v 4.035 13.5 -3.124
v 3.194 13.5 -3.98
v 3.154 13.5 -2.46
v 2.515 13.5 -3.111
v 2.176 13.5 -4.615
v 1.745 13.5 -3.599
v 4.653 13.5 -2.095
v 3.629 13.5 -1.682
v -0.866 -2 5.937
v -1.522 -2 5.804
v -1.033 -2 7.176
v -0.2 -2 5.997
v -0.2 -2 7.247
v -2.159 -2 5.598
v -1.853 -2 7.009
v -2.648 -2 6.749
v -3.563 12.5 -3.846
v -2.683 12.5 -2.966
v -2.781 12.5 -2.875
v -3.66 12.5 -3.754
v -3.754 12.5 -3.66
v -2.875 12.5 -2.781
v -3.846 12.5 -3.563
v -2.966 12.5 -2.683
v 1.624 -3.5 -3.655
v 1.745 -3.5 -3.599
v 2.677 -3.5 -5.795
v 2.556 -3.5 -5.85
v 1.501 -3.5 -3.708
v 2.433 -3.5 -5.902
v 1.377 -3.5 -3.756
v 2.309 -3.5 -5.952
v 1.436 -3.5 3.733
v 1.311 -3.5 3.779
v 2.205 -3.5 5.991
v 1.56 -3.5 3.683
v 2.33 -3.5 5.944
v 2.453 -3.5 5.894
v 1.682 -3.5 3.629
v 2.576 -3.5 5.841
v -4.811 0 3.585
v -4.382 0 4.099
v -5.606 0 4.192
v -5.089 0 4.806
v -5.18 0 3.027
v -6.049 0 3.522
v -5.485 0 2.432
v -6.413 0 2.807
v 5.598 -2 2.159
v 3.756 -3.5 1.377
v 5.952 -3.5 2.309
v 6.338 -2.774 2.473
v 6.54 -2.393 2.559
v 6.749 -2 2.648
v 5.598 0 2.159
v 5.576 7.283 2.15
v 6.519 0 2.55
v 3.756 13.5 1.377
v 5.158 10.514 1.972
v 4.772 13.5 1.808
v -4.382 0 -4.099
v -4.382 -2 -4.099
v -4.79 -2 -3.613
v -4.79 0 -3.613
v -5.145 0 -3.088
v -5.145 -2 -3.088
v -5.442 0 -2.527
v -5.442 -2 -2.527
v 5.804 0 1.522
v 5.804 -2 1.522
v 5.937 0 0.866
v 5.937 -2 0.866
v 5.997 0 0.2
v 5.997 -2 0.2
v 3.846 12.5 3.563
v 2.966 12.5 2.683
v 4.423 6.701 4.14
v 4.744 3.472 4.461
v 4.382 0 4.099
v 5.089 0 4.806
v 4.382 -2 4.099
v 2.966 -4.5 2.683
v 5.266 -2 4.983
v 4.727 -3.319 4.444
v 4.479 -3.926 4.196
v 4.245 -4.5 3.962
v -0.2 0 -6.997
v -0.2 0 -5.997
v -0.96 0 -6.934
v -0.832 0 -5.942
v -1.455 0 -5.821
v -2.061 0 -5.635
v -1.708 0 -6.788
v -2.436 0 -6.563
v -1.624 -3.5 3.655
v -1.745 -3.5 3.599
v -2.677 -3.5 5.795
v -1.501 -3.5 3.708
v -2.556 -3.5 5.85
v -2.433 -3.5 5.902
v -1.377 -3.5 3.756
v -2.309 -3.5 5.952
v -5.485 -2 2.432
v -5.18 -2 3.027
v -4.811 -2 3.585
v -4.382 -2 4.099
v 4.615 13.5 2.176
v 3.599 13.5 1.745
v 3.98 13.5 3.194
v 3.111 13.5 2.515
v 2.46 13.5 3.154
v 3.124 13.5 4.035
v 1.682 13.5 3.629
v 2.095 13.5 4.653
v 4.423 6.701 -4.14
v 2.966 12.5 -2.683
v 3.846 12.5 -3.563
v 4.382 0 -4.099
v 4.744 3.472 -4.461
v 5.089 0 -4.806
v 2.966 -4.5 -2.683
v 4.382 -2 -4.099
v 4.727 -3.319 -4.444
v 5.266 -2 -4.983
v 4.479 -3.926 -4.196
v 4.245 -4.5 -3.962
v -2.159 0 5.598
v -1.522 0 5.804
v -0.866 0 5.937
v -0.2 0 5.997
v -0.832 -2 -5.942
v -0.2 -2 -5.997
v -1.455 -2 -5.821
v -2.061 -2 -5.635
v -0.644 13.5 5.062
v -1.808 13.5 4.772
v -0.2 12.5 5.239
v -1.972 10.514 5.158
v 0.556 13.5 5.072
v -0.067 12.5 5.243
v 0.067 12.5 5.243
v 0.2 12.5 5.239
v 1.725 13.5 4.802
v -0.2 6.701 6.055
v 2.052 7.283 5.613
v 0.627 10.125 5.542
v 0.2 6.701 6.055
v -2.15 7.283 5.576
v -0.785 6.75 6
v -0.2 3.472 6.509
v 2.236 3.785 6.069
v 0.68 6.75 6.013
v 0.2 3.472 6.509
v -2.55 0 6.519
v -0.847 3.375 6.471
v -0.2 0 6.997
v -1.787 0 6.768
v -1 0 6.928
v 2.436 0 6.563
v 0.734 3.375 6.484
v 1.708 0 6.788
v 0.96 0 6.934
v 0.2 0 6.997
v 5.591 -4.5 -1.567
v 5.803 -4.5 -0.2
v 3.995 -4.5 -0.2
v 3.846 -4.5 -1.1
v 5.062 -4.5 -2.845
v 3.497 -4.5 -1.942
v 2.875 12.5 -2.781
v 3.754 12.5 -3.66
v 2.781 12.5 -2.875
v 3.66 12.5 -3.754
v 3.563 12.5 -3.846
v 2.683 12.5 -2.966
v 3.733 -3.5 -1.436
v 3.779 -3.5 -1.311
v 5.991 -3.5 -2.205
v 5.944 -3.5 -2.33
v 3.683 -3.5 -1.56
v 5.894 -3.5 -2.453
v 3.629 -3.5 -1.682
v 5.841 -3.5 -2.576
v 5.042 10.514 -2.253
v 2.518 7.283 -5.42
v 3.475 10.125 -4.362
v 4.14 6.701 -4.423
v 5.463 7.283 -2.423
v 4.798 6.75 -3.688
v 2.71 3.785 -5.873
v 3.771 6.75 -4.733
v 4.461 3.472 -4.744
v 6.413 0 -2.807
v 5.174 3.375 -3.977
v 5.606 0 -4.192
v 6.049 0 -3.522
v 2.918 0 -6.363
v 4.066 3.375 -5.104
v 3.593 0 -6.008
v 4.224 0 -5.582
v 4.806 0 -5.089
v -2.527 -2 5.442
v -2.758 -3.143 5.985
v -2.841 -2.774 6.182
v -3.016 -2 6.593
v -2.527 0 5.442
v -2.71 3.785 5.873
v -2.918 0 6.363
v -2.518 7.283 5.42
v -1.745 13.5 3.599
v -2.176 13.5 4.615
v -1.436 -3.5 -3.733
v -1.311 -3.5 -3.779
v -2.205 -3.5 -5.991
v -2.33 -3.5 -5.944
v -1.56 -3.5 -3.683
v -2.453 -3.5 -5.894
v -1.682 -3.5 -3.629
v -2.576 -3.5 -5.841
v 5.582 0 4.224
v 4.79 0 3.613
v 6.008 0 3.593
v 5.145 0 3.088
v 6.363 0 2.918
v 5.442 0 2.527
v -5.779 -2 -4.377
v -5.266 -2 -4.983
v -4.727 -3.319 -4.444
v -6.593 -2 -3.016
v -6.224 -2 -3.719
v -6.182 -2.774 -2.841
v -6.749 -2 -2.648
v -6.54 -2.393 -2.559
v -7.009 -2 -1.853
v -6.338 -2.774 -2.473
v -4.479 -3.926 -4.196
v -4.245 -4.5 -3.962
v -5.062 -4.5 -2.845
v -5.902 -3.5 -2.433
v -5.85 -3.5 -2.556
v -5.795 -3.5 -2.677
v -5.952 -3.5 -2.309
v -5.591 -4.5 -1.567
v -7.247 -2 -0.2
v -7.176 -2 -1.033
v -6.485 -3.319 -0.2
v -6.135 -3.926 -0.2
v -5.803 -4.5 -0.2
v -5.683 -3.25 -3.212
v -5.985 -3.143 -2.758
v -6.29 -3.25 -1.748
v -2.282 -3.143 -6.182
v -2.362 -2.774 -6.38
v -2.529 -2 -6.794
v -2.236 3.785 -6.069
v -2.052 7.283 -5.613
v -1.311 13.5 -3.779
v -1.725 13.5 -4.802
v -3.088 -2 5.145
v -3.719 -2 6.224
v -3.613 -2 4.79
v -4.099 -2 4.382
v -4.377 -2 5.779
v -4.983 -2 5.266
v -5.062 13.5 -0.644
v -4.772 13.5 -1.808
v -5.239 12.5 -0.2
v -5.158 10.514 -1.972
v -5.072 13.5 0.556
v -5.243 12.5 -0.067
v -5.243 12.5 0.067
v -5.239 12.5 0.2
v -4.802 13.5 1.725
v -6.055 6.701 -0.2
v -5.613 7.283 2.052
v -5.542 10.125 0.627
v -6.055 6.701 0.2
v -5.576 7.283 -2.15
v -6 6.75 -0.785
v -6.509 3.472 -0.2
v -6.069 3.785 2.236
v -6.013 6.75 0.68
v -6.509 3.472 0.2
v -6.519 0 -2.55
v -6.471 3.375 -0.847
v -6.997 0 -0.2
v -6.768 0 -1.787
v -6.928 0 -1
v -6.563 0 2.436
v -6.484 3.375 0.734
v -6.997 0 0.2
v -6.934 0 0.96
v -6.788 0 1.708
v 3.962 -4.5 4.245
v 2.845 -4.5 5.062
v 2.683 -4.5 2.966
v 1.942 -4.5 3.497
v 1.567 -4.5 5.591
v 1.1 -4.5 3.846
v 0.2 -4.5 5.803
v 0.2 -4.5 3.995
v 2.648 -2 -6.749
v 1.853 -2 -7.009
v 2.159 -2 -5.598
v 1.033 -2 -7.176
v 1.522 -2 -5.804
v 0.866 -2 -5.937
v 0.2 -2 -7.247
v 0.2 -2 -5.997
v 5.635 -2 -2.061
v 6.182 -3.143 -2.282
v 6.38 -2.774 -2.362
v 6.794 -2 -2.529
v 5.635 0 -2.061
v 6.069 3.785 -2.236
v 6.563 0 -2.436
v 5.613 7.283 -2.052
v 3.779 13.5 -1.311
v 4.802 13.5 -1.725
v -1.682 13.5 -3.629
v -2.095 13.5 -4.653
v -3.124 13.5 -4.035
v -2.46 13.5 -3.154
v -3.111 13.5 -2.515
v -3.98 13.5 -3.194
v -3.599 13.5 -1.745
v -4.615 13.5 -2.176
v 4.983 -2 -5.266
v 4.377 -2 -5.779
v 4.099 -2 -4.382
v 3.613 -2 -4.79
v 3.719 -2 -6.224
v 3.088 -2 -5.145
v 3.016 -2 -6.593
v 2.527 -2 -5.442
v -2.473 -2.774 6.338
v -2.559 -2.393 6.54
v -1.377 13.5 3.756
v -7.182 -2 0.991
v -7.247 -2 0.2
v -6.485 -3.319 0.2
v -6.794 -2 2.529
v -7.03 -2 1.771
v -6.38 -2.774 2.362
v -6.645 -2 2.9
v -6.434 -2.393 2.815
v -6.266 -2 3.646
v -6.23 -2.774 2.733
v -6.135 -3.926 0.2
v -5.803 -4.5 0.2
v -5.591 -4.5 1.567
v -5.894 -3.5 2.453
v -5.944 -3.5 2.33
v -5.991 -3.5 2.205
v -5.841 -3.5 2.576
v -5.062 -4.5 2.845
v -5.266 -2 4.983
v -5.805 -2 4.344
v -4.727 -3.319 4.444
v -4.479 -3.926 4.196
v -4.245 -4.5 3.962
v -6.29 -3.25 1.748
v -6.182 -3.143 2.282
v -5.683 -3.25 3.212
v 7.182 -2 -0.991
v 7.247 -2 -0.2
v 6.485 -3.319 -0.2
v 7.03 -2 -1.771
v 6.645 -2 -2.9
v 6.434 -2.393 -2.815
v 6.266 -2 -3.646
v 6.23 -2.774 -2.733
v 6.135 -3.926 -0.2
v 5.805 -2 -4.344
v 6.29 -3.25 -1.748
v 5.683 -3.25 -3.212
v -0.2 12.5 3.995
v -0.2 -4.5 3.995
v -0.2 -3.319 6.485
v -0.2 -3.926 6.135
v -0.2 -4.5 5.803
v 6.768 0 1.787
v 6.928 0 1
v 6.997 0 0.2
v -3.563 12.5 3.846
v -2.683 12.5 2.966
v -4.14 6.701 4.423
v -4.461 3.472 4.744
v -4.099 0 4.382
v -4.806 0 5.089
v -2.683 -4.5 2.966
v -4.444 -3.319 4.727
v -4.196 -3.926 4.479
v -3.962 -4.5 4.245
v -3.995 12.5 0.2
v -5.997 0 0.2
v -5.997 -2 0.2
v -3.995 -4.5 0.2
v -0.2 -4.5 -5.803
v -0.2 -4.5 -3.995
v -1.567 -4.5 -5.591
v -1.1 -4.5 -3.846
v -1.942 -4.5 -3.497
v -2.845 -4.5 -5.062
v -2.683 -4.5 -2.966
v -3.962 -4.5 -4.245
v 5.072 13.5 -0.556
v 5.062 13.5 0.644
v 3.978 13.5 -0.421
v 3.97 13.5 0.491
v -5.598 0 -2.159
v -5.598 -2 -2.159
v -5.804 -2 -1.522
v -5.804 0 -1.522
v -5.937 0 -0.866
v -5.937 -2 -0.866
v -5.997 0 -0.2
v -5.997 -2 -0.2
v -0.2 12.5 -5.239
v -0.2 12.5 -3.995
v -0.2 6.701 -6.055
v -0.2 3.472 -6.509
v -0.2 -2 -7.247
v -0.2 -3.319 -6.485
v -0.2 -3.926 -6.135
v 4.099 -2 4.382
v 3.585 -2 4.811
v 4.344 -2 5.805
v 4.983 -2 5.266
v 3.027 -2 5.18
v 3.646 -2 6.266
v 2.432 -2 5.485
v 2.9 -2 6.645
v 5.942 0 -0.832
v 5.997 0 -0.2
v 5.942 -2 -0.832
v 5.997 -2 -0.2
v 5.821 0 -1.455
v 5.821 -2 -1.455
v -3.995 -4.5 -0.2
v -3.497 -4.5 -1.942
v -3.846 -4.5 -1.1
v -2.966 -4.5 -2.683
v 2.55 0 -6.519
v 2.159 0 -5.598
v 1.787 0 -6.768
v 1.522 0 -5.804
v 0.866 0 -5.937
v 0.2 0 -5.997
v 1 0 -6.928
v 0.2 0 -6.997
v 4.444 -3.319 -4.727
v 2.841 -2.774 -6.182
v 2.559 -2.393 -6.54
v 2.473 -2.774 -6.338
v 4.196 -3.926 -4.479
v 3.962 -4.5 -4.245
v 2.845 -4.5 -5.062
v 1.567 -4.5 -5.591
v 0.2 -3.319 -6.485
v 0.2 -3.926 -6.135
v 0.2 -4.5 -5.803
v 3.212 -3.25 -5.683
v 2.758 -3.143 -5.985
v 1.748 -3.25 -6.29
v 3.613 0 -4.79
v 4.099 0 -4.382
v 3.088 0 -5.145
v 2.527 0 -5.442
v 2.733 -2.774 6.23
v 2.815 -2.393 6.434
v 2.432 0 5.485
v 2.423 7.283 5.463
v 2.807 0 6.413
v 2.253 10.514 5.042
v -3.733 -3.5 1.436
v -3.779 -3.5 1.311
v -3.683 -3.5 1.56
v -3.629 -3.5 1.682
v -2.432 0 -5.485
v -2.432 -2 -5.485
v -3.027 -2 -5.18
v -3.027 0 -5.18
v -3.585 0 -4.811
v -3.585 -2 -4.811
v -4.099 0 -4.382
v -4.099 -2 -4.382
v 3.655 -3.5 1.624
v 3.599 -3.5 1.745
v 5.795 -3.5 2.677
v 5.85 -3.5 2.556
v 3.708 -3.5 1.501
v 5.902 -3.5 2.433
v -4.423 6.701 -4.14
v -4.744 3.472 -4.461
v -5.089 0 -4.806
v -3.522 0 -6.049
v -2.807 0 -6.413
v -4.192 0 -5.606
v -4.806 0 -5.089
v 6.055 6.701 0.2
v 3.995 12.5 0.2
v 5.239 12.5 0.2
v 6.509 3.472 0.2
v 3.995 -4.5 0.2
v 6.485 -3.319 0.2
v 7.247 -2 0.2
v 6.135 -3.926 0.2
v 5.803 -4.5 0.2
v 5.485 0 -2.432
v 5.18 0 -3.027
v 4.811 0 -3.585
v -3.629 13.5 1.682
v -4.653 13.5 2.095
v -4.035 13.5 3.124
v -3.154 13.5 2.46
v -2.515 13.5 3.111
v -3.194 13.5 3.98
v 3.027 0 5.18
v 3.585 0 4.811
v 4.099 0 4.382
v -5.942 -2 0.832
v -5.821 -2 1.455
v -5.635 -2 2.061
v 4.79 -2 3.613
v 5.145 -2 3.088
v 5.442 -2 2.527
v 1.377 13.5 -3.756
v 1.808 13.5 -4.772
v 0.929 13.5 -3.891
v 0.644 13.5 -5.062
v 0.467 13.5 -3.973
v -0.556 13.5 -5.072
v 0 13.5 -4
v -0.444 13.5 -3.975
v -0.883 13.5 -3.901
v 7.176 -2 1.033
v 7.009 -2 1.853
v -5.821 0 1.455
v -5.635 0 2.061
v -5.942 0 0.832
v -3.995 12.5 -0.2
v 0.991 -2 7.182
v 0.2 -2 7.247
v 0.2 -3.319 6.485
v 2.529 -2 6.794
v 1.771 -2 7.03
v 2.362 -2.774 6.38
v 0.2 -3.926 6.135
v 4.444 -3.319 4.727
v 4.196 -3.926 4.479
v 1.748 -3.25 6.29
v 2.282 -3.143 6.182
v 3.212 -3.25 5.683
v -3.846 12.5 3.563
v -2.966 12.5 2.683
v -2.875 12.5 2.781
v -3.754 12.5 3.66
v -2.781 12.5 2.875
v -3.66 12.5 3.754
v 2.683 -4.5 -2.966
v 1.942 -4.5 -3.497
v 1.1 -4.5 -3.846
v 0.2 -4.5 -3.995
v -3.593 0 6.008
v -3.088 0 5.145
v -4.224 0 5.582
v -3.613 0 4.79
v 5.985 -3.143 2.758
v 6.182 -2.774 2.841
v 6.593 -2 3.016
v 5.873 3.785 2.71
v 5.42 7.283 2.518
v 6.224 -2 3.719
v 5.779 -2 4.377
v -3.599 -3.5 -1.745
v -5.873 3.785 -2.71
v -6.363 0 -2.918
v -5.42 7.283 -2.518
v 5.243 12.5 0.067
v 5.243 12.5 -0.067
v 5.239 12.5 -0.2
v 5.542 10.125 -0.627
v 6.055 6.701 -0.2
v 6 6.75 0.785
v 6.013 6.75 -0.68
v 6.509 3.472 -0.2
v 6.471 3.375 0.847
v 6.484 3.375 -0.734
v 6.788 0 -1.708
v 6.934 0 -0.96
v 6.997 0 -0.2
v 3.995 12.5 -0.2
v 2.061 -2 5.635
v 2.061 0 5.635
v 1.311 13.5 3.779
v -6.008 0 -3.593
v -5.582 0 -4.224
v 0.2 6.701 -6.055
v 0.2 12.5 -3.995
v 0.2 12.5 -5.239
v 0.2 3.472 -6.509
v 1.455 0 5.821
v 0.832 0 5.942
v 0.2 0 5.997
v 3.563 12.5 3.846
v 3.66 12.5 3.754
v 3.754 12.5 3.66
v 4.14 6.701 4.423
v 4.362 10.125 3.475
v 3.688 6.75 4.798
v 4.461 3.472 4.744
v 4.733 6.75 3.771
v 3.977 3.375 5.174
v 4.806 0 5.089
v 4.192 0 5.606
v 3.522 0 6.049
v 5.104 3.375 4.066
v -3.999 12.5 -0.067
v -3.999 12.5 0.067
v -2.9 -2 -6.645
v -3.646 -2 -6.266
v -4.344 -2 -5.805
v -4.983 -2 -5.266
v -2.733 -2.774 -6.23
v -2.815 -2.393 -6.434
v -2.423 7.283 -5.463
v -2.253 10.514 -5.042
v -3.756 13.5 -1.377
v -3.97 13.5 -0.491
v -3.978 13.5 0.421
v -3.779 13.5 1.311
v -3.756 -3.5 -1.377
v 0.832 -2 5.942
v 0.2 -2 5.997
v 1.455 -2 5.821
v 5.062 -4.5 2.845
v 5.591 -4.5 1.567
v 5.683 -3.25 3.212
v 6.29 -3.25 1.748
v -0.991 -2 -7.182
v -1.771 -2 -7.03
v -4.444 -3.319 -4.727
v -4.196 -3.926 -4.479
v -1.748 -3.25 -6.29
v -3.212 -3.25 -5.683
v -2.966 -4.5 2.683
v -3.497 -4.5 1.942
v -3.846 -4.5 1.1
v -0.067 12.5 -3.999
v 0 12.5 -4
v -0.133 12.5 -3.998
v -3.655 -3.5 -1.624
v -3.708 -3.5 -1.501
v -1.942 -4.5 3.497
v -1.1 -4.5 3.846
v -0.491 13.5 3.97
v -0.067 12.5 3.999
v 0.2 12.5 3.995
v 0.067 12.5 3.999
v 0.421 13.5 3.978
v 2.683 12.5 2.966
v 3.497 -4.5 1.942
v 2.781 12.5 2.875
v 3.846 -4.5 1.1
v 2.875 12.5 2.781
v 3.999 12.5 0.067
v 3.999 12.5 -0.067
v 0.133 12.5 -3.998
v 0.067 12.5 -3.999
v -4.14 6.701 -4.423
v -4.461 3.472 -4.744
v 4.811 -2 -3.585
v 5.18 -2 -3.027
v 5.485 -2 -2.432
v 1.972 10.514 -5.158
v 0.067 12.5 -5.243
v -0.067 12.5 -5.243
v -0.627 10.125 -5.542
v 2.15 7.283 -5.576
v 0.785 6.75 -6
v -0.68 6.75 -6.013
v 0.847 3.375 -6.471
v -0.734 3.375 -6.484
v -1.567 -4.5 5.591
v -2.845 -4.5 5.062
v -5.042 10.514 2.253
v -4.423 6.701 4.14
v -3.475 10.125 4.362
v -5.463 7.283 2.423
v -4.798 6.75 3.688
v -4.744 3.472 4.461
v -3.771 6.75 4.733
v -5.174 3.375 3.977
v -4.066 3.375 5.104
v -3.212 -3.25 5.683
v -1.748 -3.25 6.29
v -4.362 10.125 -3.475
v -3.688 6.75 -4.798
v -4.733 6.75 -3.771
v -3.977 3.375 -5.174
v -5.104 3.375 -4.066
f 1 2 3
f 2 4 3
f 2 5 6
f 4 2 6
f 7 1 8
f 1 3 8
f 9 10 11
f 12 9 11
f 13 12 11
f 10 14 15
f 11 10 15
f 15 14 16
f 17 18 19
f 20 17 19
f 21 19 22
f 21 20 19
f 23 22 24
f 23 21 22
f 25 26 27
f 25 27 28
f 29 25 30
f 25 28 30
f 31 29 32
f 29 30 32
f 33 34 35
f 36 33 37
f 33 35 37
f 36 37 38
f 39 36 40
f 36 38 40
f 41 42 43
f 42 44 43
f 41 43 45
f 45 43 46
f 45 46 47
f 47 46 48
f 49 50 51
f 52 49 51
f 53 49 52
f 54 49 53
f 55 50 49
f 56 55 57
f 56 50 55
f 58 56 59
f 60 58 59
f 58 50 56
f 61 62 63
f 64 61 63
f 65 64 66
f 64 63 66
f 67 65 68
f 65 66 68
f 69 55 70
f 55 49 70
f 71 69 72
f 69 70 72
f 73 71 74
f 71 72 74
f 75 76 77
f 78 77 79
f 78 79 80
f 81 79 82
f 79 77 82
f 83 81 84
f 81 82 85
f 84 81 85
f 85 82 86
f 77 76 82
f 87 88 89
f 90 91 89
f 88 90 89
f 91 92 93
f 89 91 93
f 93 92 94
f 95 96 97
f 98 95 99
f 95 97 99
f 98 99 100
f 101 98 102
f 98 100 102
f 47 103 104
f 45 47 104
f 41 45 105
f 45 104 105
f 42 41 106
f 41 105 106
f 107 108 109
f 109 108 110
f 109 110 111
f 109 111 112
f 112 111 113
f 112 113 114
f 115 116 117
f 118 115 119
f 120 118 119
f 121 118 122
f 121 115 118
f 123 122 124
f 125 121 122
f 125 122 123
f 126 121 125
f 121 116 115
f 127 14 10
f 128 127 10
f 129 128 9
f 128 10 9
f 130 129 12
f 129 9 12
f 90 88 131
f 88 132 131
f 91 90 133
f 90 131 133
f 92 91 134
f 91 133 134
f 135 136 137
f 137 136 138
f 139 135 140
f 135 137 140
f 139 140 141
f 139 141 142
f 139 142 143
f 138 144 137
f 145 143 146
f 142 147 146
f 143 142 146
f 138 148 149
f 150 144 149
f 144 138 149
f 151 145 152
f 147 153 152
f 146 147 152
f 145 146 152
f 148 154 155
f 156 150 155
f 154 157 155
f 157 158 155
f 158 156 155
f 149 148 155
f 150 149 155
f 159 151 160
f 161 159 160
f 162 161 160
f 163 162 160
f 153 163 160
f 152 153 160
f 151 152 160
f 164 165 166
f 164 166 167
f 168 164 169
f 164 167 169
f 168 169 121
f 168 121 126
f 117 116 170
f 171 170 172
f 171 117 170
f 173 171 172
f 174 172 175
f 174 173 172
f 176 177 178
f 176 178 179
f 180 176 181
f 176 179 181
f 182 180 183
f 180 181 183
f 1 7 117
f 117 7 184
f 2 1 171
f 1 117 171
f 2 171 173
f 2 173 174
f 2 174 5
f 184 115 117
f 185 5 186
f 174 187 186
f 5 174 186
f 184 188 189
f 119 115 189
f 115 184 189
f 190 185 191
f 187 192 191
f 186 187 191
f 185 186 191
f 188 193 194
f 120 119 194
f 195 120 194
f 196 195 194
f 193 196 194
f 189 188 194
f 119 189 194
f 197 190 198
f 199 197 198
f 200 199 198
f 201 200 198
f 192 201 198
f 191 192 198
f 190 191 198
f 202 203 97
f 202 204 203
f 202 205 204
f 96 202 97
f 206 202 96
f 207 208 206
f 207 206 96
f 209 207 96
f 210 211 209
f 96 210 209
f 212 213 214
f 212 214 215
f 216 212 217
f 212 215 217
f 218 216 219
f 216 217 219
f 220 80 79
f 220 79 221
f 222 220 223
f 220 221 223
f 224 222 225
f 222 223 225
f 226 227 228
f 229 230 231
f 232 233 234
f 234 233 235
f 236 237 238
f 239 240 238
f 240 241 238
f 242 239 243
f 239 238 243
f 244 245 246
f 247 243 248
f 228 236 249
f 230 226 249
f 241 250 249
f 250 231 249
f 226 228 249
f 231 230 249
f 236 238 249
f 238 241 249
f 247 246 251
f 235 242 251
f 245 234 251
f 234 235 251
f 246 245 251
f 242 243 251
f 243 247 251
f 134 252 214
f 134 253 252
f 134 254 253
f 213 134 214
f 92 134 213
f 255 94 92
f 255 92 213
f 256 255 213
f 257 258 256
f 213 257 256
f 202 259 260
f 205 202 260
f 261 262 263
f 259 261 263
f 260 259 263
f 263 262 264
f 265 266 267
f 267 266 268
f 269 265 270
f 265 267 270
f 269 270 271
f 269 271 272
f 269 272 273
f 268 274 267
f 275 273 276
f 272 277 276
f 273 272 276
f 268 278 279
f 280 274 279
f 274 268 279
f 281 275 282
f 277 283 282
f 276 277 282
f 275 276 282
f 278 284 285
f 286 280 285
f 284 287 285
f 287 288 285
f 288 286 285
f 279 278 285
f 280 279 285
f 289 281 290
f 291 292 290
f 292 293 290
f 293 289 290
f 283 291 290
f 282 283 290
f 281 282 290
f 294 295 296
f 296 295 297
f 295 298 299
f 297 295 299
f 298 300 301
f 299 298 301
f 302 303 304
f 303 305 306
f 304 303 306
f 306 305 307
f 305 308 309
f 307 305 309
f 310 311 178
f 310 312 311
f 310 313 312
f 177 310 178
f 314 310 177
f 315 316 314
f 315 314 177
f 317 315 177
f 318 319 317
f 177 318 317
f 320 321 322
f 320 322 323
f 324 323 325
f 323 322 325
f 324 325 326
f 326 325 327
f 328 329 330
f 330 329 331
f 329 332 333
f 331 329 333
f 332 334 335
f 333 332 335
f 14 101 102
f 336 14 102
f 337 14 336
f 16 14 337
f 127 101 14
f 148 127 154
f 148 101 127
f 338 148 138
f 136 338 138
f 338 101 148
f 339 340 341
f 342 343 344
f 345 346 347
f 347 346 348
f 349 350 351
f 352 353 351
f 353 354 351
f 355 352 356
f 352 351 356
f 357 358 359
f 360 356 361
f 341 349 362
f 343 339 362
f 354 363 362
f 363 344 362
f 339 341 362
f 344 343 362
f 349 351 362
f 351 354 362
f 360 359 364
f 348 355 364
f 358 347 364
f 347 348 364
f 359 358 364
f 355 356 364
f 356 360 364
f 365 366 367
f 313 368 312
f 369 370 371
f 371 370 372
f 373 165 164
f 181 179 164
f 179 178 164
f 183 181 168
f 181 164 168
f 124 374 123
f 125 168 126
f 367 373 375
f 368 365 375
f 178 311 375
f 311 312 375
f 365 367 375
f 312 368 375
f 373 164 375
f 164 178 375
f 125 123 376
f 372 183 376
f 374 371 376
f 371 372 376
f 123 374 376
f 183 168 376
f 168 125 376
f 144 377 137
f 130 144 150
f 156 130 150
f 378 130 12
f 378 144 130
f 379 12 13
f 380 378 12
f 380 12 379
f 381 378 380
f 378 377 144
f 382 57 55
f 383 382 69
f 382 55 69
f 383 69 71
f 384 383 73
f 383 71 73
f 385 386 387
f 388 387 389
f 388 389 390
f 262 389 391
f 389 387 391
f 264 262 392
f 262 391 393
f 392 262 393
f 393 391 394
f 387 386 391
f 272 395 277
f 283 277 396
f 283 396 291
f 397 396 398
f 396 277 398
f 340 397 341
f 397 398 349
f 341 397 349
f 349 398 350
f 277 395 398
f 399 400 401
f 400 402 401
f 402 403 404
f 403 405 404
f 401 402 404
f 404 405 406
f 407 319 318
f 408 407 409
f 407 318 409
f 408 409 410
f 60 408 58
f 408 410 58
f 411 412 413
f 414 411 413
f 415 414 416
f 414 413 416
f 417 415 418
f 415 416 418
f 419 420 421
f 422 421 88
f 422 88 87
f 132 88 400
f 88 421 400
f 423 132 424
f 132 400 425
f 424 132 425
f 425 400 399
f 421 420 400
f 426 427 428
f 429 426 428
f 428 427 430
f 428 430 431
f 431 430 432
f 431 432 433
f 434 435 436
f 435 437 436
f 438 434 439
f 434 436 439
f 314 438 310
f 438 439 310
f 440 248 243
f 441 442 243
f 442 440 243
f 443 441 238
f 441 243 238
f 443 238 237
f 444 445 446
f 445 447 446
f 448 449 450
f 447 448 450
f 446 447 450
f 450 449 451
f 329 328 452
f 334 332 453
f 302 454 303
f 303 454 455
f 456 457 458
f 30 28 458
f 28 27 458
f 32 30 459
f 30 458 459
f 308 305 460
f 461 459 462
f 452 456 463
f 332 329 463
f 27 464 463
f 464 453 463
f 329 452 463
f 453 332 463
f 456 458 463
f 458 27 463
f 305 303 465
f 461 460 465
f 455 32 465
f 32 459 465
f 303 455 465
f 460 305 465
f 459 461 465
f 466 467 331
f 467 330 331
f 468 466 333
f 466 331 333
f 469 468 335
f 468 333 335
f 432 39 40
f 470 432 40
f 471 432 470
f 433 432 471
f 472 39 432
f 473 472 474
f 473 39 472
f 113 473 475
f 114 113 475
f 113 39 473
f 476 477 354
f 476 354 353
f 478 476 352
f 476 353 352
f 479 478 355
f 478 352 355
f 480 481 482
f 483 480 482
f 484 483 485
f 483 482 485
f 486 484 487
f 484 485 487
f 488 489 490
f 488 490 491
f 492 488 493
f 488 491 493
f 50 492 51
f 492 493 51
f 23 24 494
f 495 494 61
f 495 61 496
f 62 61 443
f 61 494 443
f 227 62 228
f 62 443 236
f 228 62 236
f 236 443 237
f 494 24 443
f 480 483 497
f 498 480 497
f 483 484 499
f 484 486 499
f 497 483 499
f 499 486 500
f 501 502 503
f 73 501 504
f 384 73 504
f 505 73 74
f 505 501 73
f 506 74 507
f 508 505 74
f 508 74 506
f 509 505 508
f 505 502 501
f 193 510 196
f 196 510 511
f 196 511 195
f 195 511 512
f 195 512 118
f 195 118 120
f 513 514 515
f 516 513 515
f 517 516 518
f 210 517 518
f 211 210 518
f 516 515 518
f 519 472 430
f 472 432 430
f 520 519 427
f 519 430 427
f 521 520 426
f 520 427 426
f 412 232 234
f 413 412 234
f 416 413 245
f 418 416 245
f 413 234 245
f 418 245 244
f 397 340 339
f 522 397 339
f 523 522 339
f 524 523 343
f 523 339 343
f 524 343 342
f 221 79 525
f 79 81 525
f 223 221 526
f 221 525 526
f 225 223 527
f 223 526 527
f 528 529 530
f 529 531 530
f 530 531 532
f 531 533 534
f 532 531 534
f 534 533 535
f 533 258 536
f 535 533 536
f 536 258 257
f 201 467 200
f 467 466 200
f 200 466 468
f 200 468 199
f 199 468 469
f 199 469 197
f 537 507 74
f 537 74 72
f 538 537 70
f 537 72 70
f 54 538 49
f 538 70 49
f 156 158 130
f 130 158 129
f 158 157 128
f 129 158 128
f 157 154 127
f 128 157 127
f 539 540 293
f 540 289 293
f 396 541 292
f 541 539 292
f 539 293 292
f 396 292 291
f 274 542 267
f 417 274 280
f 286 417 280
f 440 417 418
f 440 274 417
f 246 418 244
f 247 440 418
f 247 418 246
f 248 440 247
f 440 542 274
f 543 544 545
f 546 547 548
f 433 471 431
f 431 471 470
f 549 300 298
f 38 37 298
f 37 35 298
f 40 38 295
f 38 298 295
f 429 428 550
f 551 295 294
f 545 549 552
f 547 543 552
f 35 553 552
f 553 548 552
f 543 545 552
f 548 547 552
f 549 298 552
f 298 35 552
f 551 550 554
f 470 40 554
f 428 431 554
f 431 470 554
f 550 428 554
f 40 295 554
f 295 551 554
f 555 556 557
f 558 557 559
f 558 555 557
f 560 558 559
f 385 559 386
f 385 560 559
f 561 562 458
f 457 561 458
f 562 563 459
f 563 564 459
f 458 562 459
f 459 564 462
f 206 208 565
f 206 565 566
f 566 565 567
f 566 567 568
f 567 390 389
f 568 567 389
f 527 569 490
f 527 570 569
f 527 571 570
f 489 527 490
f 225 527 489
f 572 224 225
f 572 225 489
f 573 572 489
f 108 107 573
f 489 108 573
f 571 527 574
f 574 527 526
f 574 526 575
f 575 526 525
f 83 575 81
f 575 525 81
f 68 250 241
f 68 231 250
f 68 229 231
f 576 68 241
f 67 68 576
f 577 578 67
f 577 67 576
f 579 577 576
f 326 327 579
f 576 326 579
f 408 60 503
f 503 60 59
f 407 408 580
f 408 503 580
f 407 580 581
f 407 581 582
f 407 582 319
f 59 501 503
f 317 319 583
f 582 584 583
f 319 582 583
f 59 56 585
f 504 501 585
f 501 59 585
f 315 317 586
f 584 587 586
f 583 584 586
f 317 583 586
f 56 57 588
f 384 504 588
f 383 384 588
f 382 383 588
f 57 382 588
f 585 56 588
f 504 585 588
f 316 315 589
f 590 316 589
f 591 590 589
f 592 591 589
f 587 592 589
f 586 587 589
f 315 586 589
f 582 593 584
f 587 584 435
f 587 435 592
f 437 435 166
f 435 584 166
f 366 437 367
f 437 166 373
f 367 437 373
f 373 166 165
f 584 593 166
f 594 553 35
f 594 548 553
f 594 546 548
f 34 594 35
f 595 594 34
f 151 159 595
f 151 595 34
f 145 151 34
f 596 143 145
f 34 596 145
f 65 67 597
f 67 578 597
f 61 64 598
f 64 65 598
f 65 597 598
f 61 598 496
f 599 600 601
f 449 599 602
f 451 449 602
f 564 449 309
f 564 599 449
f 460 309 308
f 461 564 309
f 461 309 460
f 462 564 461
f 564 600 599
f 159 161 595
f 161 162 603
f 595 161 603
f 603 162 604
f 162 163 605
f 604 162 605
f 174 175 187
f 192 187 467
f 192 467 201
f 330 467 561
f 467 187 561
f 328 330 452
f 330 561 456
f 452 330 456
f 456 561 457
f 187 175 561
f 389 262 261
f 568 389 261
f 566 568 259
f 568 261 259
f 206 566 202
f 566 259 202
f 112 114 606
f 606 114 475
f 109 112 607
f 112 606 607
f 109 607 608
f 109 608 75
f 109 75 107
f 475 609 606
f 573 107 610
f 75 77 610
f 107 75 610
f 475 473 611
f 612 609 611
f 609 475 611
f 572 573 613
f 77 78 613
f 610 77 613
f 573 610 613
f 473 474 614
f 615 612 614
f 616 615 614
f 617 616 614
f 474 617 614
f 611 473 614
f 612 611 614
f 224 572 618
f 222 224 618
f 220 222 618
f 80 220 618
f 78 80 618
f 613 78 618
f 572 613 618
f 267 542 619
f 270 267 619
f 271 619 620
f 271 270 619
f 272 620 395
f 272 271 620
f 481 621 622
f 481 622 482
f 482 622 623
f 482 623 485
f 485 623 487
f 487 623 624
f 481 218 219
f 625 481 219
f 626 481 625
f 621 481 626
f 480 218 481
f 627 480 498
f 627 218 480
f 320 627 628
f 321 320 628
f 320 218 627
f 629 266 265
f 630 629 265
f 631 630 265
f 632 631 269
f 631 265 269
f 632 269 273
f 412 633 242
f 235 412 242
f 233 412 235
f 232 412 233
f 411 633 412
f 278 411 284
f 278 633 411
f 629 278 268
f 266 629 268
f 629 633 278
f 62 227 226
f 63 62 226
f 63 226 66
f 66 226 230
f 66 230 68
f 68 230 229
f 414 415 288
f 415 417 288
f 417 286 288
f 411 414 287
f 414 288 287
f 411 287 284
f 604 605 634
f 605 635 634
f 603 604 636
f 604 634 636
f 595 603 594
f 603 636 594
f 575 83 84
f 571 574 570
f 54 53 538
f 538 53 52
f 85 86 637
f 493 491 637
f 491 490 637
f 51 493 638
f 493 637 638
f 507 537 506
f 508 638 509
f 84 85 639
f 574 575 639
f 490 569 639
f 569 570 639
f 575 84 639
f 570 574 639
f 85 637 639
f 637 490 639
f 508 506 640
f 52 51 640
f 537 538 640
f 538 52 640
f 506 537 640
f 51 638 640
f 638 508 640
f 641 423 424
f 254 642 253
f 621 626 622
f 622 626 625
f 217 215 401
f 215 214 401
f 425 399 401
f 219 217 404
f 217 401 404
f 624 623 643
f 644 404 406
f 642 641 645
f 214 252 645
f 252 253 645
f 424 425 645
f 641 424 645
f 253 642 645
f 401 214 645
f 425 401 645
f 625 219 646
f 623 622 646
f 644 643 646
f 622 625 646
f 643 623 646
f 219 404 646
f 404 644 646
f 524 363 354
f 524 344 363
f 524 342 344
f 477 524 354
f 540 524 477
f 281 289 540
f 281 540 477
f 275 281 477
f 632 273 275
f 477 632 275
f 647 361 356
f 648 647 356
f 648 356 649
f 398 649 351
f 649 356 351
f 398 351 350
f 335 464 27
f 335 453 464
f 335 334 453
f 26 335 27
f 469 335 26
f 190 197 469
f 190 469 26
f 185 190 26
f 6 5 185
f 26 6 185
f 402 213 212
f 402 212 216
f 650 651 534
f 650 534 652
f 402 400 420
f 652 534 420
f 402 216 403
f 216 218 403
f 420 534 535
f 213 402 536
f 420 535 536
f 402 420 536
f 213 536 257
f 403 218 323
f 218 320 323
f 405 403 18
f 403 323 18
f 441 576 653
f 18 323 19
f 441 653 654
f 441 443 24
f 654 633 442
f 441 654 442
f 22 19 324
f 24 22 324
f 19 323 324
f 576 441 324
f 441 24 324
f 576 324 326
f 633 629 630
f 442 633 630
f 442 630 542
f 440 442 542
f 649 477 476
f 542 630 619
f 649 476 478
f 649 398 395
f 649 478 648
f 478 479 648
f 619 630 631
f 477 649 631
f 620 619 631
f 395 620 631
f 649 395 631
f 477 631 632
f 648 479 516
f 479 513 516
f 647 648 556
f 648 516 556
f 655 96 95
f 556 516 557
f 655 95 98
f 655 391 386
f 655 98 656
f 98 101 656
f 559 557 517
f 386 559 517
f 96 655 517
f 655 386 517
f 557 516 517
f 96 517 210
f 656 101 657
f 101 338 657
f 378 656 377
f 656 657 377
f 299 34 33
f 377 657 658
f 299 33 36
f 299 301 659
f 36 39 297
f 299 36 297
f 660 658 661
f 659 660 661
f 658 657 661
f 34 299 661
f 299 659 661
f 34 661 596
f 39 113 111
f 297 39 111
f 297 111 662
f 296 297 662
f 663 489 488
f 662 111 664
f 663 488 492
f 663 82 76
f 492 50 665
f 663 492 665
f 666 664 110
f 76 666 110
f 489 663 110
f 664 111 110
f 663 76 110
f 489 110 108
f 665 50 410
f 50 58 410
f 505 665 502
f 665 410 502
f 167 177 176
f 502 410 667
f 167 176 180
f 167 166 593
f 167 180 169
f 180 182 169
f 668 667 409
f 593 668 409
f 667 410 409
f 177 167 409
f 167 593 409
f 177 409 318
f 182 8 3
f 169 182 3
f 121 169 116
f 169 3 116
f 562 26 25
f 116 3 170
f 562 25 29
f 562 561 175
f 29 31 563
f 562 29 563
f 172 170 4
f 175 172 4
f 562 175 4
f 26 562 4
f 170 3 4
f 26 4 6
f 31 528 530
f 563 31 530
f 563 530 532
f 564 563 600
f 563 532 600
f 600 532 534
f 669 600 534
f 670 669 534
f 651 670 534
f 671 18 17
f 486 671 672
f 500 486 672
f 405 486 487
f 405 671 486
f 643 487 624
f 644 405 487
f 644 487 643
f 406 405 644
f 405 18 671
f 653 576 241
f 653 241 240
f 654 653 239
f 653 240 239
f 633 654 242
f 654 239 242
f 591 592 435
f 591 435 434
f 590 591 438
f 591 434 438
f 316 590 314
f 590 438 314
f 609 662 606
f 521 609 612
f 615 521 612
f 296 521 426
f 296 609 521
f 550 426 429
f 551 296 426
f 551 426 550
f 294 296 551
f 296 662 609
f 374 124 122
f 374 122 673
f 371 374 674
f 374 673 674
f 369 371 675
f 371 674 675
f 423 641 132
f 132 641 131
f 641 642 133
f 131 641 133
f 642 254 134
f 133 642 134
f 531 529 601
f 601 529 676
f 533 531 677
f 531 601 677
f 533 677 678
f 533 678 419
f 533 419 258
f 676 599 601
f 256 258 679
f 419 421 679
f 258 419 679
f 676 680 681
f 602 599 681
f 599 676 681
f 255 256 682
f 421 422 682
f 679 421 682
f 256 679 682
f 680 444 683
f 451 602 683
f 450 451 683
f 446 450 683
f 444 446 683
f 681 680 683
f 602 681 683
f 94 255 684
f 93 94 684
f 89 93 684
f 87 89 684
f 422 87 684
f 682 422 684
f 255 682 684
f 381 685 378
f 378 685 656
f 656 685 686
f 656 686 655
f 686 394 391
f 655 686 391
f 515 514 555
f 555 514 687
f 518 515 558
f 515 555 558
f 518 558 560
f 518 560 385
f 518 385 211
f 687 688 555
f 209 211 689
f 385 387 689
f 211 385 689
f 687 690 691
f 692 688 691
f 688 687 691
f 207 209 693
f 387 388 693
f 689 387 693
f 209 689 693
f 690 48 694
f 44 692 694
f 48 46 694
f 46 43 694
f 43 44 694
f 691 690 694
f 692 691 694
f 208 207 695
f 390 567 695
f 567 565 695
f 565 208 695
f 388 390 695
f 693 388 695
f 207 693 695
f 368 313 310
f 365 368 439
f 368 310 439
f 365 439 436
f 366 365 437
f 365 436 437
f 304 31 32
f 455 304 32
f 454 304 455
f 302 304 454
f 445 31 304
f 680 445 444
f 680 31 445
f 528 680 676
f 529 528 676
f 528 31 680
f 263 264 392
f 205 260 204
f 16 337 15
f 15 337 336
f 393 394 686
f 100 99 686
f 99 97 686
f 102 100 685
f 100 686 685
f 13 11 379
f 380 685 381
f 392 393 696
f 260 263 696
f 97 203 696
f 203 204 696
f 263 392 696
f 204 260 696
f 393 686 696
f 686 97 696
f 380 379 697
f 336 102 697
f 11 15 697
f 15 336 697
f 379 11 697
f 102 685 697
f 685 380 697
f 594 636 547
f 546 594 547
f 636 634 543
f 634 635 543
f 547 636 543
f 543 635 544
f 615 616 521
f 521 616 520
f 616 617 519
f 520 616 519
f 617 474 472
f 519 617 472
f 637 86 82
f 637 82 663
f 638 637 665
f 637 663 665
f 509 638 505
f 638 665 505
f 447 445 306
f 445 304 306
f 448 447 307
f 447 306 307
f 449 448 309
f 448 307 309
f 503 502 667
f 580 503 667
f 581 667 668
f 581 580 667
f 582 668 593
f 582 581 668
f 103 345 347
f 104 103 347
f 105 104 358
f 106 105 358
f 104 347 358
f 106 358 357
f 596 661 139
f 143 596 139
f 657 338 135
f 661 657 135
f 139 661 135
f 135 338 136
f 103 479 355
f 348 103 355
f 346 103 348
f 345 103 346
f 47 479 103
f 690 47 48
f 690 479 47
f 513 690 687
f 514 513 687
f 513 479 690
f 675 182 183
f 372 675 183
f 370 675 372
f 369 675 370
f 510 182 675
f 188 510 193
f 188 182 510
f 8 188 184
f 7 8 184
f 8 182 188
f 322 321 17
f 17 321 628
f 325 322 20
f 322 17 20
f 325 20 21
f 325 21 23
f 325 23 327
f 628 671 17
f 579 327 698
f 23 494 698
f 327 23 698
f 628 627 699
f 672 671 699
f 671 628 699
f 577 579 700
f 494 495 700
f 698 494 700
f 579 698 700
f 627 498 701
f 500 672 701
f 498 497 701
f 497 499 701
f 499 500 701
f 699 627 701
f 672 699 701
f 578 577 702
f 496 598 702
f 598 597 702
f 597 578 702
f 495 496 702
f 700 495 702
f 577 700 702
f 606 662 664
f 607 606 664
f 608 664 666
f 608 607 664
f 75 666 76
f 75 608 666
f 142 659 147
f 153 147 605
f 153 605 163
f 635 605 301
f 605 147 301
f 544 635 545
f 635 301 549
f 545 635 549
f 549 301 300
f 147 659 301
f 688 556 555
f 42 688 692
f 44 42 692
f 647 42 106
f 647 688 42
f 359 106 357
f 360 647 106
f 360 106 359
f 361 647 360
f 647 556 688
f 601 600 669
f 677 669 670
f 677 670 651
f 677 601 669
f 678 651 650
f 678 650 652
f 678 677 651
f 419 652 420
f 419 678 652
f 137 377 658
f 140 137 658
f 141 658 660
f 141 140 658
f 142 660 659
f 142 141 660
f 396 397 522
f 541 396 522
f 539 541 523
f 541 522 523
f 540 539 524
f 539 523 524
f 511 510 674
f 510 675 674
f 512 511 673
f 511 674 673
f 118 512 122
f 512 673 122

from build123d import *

# Parameters (mm, degrees)
SKETCH2_W               = 0.4
SKETCH2_H               = 3.255003129
EXTRUDED_CUT1_DEPTH     = 17
EXTRUDED_CUT2_DEPTH     = 17
CIRCULAR_PATTERN1_COUNT = 8


with BuildPart() as part:
    # Sketch1 → Rotation1 (revolve)
    with BuildSketch(Plane.XY):
        Polygon((-4, -4.5), (-4, 13.5), (-5.102698732, 13.5), (-7, 0), (-6, 0), (-6, -2), (-7.25, -2), (-5.806624327, -4.5), align=None)
    revolve(axis=Axis((0, 0, 0), (0, 1, 0)))

    # Sketch2 → Extruded Cut1 (cut)
    with BuildSketch(Plane.XZ.offset(4.5)):
        with Locations((0, 5.622498436)):
            Rectangle(SKETCH2_W, SKETCH2_H)
    extruded_cut1 = extrude(amount=-EXTRUDED_CUT1_DEPTH, mode=Mode.SUBTRACT)

    # Sketch3 → Extruded Cut2 (cut)
    with BuildSketch(Plane(origin=(0, 13.5, 0), x_dir=(1, 0, 0), z_dir=(0, 1, 0))):
        Polygon((-0.185436771, -0.074921319), (-2.901334573, 6.647161627), (-2.530461031, 6.797004264), (0.185436771, 0.074921319), align=None)
    extruded_cut2 = extrude(amount=-EXTRUDED_CUT2_DEPTH, mode=Mode.SUBTRACT)

    # Circular Pattern1: Extruded Cut1, Extruded Cut2 ×8 about axis
    circular_pattern1_axis = Axis((0, 13.5, 0), (0, -1, 0))
    add([extruded_cut1.rotate(circular_pattern1_axis, i * 360 / CIRCULAR_PATTERN1_COUNT) for i in range(1, CIRCULAR_PATTERN1_COUNT)], mode=Mode.SUBTRACT)
    add([extruded_cut2.rotate(circular_pattern1_axis, i * 360 / CIRCULAR_PATTERN1_COUNT) for i in range(1, CIRCULAR_PATTERN1_COUNT)], mode=Mode.SUBTRACT)


solid = part.part
